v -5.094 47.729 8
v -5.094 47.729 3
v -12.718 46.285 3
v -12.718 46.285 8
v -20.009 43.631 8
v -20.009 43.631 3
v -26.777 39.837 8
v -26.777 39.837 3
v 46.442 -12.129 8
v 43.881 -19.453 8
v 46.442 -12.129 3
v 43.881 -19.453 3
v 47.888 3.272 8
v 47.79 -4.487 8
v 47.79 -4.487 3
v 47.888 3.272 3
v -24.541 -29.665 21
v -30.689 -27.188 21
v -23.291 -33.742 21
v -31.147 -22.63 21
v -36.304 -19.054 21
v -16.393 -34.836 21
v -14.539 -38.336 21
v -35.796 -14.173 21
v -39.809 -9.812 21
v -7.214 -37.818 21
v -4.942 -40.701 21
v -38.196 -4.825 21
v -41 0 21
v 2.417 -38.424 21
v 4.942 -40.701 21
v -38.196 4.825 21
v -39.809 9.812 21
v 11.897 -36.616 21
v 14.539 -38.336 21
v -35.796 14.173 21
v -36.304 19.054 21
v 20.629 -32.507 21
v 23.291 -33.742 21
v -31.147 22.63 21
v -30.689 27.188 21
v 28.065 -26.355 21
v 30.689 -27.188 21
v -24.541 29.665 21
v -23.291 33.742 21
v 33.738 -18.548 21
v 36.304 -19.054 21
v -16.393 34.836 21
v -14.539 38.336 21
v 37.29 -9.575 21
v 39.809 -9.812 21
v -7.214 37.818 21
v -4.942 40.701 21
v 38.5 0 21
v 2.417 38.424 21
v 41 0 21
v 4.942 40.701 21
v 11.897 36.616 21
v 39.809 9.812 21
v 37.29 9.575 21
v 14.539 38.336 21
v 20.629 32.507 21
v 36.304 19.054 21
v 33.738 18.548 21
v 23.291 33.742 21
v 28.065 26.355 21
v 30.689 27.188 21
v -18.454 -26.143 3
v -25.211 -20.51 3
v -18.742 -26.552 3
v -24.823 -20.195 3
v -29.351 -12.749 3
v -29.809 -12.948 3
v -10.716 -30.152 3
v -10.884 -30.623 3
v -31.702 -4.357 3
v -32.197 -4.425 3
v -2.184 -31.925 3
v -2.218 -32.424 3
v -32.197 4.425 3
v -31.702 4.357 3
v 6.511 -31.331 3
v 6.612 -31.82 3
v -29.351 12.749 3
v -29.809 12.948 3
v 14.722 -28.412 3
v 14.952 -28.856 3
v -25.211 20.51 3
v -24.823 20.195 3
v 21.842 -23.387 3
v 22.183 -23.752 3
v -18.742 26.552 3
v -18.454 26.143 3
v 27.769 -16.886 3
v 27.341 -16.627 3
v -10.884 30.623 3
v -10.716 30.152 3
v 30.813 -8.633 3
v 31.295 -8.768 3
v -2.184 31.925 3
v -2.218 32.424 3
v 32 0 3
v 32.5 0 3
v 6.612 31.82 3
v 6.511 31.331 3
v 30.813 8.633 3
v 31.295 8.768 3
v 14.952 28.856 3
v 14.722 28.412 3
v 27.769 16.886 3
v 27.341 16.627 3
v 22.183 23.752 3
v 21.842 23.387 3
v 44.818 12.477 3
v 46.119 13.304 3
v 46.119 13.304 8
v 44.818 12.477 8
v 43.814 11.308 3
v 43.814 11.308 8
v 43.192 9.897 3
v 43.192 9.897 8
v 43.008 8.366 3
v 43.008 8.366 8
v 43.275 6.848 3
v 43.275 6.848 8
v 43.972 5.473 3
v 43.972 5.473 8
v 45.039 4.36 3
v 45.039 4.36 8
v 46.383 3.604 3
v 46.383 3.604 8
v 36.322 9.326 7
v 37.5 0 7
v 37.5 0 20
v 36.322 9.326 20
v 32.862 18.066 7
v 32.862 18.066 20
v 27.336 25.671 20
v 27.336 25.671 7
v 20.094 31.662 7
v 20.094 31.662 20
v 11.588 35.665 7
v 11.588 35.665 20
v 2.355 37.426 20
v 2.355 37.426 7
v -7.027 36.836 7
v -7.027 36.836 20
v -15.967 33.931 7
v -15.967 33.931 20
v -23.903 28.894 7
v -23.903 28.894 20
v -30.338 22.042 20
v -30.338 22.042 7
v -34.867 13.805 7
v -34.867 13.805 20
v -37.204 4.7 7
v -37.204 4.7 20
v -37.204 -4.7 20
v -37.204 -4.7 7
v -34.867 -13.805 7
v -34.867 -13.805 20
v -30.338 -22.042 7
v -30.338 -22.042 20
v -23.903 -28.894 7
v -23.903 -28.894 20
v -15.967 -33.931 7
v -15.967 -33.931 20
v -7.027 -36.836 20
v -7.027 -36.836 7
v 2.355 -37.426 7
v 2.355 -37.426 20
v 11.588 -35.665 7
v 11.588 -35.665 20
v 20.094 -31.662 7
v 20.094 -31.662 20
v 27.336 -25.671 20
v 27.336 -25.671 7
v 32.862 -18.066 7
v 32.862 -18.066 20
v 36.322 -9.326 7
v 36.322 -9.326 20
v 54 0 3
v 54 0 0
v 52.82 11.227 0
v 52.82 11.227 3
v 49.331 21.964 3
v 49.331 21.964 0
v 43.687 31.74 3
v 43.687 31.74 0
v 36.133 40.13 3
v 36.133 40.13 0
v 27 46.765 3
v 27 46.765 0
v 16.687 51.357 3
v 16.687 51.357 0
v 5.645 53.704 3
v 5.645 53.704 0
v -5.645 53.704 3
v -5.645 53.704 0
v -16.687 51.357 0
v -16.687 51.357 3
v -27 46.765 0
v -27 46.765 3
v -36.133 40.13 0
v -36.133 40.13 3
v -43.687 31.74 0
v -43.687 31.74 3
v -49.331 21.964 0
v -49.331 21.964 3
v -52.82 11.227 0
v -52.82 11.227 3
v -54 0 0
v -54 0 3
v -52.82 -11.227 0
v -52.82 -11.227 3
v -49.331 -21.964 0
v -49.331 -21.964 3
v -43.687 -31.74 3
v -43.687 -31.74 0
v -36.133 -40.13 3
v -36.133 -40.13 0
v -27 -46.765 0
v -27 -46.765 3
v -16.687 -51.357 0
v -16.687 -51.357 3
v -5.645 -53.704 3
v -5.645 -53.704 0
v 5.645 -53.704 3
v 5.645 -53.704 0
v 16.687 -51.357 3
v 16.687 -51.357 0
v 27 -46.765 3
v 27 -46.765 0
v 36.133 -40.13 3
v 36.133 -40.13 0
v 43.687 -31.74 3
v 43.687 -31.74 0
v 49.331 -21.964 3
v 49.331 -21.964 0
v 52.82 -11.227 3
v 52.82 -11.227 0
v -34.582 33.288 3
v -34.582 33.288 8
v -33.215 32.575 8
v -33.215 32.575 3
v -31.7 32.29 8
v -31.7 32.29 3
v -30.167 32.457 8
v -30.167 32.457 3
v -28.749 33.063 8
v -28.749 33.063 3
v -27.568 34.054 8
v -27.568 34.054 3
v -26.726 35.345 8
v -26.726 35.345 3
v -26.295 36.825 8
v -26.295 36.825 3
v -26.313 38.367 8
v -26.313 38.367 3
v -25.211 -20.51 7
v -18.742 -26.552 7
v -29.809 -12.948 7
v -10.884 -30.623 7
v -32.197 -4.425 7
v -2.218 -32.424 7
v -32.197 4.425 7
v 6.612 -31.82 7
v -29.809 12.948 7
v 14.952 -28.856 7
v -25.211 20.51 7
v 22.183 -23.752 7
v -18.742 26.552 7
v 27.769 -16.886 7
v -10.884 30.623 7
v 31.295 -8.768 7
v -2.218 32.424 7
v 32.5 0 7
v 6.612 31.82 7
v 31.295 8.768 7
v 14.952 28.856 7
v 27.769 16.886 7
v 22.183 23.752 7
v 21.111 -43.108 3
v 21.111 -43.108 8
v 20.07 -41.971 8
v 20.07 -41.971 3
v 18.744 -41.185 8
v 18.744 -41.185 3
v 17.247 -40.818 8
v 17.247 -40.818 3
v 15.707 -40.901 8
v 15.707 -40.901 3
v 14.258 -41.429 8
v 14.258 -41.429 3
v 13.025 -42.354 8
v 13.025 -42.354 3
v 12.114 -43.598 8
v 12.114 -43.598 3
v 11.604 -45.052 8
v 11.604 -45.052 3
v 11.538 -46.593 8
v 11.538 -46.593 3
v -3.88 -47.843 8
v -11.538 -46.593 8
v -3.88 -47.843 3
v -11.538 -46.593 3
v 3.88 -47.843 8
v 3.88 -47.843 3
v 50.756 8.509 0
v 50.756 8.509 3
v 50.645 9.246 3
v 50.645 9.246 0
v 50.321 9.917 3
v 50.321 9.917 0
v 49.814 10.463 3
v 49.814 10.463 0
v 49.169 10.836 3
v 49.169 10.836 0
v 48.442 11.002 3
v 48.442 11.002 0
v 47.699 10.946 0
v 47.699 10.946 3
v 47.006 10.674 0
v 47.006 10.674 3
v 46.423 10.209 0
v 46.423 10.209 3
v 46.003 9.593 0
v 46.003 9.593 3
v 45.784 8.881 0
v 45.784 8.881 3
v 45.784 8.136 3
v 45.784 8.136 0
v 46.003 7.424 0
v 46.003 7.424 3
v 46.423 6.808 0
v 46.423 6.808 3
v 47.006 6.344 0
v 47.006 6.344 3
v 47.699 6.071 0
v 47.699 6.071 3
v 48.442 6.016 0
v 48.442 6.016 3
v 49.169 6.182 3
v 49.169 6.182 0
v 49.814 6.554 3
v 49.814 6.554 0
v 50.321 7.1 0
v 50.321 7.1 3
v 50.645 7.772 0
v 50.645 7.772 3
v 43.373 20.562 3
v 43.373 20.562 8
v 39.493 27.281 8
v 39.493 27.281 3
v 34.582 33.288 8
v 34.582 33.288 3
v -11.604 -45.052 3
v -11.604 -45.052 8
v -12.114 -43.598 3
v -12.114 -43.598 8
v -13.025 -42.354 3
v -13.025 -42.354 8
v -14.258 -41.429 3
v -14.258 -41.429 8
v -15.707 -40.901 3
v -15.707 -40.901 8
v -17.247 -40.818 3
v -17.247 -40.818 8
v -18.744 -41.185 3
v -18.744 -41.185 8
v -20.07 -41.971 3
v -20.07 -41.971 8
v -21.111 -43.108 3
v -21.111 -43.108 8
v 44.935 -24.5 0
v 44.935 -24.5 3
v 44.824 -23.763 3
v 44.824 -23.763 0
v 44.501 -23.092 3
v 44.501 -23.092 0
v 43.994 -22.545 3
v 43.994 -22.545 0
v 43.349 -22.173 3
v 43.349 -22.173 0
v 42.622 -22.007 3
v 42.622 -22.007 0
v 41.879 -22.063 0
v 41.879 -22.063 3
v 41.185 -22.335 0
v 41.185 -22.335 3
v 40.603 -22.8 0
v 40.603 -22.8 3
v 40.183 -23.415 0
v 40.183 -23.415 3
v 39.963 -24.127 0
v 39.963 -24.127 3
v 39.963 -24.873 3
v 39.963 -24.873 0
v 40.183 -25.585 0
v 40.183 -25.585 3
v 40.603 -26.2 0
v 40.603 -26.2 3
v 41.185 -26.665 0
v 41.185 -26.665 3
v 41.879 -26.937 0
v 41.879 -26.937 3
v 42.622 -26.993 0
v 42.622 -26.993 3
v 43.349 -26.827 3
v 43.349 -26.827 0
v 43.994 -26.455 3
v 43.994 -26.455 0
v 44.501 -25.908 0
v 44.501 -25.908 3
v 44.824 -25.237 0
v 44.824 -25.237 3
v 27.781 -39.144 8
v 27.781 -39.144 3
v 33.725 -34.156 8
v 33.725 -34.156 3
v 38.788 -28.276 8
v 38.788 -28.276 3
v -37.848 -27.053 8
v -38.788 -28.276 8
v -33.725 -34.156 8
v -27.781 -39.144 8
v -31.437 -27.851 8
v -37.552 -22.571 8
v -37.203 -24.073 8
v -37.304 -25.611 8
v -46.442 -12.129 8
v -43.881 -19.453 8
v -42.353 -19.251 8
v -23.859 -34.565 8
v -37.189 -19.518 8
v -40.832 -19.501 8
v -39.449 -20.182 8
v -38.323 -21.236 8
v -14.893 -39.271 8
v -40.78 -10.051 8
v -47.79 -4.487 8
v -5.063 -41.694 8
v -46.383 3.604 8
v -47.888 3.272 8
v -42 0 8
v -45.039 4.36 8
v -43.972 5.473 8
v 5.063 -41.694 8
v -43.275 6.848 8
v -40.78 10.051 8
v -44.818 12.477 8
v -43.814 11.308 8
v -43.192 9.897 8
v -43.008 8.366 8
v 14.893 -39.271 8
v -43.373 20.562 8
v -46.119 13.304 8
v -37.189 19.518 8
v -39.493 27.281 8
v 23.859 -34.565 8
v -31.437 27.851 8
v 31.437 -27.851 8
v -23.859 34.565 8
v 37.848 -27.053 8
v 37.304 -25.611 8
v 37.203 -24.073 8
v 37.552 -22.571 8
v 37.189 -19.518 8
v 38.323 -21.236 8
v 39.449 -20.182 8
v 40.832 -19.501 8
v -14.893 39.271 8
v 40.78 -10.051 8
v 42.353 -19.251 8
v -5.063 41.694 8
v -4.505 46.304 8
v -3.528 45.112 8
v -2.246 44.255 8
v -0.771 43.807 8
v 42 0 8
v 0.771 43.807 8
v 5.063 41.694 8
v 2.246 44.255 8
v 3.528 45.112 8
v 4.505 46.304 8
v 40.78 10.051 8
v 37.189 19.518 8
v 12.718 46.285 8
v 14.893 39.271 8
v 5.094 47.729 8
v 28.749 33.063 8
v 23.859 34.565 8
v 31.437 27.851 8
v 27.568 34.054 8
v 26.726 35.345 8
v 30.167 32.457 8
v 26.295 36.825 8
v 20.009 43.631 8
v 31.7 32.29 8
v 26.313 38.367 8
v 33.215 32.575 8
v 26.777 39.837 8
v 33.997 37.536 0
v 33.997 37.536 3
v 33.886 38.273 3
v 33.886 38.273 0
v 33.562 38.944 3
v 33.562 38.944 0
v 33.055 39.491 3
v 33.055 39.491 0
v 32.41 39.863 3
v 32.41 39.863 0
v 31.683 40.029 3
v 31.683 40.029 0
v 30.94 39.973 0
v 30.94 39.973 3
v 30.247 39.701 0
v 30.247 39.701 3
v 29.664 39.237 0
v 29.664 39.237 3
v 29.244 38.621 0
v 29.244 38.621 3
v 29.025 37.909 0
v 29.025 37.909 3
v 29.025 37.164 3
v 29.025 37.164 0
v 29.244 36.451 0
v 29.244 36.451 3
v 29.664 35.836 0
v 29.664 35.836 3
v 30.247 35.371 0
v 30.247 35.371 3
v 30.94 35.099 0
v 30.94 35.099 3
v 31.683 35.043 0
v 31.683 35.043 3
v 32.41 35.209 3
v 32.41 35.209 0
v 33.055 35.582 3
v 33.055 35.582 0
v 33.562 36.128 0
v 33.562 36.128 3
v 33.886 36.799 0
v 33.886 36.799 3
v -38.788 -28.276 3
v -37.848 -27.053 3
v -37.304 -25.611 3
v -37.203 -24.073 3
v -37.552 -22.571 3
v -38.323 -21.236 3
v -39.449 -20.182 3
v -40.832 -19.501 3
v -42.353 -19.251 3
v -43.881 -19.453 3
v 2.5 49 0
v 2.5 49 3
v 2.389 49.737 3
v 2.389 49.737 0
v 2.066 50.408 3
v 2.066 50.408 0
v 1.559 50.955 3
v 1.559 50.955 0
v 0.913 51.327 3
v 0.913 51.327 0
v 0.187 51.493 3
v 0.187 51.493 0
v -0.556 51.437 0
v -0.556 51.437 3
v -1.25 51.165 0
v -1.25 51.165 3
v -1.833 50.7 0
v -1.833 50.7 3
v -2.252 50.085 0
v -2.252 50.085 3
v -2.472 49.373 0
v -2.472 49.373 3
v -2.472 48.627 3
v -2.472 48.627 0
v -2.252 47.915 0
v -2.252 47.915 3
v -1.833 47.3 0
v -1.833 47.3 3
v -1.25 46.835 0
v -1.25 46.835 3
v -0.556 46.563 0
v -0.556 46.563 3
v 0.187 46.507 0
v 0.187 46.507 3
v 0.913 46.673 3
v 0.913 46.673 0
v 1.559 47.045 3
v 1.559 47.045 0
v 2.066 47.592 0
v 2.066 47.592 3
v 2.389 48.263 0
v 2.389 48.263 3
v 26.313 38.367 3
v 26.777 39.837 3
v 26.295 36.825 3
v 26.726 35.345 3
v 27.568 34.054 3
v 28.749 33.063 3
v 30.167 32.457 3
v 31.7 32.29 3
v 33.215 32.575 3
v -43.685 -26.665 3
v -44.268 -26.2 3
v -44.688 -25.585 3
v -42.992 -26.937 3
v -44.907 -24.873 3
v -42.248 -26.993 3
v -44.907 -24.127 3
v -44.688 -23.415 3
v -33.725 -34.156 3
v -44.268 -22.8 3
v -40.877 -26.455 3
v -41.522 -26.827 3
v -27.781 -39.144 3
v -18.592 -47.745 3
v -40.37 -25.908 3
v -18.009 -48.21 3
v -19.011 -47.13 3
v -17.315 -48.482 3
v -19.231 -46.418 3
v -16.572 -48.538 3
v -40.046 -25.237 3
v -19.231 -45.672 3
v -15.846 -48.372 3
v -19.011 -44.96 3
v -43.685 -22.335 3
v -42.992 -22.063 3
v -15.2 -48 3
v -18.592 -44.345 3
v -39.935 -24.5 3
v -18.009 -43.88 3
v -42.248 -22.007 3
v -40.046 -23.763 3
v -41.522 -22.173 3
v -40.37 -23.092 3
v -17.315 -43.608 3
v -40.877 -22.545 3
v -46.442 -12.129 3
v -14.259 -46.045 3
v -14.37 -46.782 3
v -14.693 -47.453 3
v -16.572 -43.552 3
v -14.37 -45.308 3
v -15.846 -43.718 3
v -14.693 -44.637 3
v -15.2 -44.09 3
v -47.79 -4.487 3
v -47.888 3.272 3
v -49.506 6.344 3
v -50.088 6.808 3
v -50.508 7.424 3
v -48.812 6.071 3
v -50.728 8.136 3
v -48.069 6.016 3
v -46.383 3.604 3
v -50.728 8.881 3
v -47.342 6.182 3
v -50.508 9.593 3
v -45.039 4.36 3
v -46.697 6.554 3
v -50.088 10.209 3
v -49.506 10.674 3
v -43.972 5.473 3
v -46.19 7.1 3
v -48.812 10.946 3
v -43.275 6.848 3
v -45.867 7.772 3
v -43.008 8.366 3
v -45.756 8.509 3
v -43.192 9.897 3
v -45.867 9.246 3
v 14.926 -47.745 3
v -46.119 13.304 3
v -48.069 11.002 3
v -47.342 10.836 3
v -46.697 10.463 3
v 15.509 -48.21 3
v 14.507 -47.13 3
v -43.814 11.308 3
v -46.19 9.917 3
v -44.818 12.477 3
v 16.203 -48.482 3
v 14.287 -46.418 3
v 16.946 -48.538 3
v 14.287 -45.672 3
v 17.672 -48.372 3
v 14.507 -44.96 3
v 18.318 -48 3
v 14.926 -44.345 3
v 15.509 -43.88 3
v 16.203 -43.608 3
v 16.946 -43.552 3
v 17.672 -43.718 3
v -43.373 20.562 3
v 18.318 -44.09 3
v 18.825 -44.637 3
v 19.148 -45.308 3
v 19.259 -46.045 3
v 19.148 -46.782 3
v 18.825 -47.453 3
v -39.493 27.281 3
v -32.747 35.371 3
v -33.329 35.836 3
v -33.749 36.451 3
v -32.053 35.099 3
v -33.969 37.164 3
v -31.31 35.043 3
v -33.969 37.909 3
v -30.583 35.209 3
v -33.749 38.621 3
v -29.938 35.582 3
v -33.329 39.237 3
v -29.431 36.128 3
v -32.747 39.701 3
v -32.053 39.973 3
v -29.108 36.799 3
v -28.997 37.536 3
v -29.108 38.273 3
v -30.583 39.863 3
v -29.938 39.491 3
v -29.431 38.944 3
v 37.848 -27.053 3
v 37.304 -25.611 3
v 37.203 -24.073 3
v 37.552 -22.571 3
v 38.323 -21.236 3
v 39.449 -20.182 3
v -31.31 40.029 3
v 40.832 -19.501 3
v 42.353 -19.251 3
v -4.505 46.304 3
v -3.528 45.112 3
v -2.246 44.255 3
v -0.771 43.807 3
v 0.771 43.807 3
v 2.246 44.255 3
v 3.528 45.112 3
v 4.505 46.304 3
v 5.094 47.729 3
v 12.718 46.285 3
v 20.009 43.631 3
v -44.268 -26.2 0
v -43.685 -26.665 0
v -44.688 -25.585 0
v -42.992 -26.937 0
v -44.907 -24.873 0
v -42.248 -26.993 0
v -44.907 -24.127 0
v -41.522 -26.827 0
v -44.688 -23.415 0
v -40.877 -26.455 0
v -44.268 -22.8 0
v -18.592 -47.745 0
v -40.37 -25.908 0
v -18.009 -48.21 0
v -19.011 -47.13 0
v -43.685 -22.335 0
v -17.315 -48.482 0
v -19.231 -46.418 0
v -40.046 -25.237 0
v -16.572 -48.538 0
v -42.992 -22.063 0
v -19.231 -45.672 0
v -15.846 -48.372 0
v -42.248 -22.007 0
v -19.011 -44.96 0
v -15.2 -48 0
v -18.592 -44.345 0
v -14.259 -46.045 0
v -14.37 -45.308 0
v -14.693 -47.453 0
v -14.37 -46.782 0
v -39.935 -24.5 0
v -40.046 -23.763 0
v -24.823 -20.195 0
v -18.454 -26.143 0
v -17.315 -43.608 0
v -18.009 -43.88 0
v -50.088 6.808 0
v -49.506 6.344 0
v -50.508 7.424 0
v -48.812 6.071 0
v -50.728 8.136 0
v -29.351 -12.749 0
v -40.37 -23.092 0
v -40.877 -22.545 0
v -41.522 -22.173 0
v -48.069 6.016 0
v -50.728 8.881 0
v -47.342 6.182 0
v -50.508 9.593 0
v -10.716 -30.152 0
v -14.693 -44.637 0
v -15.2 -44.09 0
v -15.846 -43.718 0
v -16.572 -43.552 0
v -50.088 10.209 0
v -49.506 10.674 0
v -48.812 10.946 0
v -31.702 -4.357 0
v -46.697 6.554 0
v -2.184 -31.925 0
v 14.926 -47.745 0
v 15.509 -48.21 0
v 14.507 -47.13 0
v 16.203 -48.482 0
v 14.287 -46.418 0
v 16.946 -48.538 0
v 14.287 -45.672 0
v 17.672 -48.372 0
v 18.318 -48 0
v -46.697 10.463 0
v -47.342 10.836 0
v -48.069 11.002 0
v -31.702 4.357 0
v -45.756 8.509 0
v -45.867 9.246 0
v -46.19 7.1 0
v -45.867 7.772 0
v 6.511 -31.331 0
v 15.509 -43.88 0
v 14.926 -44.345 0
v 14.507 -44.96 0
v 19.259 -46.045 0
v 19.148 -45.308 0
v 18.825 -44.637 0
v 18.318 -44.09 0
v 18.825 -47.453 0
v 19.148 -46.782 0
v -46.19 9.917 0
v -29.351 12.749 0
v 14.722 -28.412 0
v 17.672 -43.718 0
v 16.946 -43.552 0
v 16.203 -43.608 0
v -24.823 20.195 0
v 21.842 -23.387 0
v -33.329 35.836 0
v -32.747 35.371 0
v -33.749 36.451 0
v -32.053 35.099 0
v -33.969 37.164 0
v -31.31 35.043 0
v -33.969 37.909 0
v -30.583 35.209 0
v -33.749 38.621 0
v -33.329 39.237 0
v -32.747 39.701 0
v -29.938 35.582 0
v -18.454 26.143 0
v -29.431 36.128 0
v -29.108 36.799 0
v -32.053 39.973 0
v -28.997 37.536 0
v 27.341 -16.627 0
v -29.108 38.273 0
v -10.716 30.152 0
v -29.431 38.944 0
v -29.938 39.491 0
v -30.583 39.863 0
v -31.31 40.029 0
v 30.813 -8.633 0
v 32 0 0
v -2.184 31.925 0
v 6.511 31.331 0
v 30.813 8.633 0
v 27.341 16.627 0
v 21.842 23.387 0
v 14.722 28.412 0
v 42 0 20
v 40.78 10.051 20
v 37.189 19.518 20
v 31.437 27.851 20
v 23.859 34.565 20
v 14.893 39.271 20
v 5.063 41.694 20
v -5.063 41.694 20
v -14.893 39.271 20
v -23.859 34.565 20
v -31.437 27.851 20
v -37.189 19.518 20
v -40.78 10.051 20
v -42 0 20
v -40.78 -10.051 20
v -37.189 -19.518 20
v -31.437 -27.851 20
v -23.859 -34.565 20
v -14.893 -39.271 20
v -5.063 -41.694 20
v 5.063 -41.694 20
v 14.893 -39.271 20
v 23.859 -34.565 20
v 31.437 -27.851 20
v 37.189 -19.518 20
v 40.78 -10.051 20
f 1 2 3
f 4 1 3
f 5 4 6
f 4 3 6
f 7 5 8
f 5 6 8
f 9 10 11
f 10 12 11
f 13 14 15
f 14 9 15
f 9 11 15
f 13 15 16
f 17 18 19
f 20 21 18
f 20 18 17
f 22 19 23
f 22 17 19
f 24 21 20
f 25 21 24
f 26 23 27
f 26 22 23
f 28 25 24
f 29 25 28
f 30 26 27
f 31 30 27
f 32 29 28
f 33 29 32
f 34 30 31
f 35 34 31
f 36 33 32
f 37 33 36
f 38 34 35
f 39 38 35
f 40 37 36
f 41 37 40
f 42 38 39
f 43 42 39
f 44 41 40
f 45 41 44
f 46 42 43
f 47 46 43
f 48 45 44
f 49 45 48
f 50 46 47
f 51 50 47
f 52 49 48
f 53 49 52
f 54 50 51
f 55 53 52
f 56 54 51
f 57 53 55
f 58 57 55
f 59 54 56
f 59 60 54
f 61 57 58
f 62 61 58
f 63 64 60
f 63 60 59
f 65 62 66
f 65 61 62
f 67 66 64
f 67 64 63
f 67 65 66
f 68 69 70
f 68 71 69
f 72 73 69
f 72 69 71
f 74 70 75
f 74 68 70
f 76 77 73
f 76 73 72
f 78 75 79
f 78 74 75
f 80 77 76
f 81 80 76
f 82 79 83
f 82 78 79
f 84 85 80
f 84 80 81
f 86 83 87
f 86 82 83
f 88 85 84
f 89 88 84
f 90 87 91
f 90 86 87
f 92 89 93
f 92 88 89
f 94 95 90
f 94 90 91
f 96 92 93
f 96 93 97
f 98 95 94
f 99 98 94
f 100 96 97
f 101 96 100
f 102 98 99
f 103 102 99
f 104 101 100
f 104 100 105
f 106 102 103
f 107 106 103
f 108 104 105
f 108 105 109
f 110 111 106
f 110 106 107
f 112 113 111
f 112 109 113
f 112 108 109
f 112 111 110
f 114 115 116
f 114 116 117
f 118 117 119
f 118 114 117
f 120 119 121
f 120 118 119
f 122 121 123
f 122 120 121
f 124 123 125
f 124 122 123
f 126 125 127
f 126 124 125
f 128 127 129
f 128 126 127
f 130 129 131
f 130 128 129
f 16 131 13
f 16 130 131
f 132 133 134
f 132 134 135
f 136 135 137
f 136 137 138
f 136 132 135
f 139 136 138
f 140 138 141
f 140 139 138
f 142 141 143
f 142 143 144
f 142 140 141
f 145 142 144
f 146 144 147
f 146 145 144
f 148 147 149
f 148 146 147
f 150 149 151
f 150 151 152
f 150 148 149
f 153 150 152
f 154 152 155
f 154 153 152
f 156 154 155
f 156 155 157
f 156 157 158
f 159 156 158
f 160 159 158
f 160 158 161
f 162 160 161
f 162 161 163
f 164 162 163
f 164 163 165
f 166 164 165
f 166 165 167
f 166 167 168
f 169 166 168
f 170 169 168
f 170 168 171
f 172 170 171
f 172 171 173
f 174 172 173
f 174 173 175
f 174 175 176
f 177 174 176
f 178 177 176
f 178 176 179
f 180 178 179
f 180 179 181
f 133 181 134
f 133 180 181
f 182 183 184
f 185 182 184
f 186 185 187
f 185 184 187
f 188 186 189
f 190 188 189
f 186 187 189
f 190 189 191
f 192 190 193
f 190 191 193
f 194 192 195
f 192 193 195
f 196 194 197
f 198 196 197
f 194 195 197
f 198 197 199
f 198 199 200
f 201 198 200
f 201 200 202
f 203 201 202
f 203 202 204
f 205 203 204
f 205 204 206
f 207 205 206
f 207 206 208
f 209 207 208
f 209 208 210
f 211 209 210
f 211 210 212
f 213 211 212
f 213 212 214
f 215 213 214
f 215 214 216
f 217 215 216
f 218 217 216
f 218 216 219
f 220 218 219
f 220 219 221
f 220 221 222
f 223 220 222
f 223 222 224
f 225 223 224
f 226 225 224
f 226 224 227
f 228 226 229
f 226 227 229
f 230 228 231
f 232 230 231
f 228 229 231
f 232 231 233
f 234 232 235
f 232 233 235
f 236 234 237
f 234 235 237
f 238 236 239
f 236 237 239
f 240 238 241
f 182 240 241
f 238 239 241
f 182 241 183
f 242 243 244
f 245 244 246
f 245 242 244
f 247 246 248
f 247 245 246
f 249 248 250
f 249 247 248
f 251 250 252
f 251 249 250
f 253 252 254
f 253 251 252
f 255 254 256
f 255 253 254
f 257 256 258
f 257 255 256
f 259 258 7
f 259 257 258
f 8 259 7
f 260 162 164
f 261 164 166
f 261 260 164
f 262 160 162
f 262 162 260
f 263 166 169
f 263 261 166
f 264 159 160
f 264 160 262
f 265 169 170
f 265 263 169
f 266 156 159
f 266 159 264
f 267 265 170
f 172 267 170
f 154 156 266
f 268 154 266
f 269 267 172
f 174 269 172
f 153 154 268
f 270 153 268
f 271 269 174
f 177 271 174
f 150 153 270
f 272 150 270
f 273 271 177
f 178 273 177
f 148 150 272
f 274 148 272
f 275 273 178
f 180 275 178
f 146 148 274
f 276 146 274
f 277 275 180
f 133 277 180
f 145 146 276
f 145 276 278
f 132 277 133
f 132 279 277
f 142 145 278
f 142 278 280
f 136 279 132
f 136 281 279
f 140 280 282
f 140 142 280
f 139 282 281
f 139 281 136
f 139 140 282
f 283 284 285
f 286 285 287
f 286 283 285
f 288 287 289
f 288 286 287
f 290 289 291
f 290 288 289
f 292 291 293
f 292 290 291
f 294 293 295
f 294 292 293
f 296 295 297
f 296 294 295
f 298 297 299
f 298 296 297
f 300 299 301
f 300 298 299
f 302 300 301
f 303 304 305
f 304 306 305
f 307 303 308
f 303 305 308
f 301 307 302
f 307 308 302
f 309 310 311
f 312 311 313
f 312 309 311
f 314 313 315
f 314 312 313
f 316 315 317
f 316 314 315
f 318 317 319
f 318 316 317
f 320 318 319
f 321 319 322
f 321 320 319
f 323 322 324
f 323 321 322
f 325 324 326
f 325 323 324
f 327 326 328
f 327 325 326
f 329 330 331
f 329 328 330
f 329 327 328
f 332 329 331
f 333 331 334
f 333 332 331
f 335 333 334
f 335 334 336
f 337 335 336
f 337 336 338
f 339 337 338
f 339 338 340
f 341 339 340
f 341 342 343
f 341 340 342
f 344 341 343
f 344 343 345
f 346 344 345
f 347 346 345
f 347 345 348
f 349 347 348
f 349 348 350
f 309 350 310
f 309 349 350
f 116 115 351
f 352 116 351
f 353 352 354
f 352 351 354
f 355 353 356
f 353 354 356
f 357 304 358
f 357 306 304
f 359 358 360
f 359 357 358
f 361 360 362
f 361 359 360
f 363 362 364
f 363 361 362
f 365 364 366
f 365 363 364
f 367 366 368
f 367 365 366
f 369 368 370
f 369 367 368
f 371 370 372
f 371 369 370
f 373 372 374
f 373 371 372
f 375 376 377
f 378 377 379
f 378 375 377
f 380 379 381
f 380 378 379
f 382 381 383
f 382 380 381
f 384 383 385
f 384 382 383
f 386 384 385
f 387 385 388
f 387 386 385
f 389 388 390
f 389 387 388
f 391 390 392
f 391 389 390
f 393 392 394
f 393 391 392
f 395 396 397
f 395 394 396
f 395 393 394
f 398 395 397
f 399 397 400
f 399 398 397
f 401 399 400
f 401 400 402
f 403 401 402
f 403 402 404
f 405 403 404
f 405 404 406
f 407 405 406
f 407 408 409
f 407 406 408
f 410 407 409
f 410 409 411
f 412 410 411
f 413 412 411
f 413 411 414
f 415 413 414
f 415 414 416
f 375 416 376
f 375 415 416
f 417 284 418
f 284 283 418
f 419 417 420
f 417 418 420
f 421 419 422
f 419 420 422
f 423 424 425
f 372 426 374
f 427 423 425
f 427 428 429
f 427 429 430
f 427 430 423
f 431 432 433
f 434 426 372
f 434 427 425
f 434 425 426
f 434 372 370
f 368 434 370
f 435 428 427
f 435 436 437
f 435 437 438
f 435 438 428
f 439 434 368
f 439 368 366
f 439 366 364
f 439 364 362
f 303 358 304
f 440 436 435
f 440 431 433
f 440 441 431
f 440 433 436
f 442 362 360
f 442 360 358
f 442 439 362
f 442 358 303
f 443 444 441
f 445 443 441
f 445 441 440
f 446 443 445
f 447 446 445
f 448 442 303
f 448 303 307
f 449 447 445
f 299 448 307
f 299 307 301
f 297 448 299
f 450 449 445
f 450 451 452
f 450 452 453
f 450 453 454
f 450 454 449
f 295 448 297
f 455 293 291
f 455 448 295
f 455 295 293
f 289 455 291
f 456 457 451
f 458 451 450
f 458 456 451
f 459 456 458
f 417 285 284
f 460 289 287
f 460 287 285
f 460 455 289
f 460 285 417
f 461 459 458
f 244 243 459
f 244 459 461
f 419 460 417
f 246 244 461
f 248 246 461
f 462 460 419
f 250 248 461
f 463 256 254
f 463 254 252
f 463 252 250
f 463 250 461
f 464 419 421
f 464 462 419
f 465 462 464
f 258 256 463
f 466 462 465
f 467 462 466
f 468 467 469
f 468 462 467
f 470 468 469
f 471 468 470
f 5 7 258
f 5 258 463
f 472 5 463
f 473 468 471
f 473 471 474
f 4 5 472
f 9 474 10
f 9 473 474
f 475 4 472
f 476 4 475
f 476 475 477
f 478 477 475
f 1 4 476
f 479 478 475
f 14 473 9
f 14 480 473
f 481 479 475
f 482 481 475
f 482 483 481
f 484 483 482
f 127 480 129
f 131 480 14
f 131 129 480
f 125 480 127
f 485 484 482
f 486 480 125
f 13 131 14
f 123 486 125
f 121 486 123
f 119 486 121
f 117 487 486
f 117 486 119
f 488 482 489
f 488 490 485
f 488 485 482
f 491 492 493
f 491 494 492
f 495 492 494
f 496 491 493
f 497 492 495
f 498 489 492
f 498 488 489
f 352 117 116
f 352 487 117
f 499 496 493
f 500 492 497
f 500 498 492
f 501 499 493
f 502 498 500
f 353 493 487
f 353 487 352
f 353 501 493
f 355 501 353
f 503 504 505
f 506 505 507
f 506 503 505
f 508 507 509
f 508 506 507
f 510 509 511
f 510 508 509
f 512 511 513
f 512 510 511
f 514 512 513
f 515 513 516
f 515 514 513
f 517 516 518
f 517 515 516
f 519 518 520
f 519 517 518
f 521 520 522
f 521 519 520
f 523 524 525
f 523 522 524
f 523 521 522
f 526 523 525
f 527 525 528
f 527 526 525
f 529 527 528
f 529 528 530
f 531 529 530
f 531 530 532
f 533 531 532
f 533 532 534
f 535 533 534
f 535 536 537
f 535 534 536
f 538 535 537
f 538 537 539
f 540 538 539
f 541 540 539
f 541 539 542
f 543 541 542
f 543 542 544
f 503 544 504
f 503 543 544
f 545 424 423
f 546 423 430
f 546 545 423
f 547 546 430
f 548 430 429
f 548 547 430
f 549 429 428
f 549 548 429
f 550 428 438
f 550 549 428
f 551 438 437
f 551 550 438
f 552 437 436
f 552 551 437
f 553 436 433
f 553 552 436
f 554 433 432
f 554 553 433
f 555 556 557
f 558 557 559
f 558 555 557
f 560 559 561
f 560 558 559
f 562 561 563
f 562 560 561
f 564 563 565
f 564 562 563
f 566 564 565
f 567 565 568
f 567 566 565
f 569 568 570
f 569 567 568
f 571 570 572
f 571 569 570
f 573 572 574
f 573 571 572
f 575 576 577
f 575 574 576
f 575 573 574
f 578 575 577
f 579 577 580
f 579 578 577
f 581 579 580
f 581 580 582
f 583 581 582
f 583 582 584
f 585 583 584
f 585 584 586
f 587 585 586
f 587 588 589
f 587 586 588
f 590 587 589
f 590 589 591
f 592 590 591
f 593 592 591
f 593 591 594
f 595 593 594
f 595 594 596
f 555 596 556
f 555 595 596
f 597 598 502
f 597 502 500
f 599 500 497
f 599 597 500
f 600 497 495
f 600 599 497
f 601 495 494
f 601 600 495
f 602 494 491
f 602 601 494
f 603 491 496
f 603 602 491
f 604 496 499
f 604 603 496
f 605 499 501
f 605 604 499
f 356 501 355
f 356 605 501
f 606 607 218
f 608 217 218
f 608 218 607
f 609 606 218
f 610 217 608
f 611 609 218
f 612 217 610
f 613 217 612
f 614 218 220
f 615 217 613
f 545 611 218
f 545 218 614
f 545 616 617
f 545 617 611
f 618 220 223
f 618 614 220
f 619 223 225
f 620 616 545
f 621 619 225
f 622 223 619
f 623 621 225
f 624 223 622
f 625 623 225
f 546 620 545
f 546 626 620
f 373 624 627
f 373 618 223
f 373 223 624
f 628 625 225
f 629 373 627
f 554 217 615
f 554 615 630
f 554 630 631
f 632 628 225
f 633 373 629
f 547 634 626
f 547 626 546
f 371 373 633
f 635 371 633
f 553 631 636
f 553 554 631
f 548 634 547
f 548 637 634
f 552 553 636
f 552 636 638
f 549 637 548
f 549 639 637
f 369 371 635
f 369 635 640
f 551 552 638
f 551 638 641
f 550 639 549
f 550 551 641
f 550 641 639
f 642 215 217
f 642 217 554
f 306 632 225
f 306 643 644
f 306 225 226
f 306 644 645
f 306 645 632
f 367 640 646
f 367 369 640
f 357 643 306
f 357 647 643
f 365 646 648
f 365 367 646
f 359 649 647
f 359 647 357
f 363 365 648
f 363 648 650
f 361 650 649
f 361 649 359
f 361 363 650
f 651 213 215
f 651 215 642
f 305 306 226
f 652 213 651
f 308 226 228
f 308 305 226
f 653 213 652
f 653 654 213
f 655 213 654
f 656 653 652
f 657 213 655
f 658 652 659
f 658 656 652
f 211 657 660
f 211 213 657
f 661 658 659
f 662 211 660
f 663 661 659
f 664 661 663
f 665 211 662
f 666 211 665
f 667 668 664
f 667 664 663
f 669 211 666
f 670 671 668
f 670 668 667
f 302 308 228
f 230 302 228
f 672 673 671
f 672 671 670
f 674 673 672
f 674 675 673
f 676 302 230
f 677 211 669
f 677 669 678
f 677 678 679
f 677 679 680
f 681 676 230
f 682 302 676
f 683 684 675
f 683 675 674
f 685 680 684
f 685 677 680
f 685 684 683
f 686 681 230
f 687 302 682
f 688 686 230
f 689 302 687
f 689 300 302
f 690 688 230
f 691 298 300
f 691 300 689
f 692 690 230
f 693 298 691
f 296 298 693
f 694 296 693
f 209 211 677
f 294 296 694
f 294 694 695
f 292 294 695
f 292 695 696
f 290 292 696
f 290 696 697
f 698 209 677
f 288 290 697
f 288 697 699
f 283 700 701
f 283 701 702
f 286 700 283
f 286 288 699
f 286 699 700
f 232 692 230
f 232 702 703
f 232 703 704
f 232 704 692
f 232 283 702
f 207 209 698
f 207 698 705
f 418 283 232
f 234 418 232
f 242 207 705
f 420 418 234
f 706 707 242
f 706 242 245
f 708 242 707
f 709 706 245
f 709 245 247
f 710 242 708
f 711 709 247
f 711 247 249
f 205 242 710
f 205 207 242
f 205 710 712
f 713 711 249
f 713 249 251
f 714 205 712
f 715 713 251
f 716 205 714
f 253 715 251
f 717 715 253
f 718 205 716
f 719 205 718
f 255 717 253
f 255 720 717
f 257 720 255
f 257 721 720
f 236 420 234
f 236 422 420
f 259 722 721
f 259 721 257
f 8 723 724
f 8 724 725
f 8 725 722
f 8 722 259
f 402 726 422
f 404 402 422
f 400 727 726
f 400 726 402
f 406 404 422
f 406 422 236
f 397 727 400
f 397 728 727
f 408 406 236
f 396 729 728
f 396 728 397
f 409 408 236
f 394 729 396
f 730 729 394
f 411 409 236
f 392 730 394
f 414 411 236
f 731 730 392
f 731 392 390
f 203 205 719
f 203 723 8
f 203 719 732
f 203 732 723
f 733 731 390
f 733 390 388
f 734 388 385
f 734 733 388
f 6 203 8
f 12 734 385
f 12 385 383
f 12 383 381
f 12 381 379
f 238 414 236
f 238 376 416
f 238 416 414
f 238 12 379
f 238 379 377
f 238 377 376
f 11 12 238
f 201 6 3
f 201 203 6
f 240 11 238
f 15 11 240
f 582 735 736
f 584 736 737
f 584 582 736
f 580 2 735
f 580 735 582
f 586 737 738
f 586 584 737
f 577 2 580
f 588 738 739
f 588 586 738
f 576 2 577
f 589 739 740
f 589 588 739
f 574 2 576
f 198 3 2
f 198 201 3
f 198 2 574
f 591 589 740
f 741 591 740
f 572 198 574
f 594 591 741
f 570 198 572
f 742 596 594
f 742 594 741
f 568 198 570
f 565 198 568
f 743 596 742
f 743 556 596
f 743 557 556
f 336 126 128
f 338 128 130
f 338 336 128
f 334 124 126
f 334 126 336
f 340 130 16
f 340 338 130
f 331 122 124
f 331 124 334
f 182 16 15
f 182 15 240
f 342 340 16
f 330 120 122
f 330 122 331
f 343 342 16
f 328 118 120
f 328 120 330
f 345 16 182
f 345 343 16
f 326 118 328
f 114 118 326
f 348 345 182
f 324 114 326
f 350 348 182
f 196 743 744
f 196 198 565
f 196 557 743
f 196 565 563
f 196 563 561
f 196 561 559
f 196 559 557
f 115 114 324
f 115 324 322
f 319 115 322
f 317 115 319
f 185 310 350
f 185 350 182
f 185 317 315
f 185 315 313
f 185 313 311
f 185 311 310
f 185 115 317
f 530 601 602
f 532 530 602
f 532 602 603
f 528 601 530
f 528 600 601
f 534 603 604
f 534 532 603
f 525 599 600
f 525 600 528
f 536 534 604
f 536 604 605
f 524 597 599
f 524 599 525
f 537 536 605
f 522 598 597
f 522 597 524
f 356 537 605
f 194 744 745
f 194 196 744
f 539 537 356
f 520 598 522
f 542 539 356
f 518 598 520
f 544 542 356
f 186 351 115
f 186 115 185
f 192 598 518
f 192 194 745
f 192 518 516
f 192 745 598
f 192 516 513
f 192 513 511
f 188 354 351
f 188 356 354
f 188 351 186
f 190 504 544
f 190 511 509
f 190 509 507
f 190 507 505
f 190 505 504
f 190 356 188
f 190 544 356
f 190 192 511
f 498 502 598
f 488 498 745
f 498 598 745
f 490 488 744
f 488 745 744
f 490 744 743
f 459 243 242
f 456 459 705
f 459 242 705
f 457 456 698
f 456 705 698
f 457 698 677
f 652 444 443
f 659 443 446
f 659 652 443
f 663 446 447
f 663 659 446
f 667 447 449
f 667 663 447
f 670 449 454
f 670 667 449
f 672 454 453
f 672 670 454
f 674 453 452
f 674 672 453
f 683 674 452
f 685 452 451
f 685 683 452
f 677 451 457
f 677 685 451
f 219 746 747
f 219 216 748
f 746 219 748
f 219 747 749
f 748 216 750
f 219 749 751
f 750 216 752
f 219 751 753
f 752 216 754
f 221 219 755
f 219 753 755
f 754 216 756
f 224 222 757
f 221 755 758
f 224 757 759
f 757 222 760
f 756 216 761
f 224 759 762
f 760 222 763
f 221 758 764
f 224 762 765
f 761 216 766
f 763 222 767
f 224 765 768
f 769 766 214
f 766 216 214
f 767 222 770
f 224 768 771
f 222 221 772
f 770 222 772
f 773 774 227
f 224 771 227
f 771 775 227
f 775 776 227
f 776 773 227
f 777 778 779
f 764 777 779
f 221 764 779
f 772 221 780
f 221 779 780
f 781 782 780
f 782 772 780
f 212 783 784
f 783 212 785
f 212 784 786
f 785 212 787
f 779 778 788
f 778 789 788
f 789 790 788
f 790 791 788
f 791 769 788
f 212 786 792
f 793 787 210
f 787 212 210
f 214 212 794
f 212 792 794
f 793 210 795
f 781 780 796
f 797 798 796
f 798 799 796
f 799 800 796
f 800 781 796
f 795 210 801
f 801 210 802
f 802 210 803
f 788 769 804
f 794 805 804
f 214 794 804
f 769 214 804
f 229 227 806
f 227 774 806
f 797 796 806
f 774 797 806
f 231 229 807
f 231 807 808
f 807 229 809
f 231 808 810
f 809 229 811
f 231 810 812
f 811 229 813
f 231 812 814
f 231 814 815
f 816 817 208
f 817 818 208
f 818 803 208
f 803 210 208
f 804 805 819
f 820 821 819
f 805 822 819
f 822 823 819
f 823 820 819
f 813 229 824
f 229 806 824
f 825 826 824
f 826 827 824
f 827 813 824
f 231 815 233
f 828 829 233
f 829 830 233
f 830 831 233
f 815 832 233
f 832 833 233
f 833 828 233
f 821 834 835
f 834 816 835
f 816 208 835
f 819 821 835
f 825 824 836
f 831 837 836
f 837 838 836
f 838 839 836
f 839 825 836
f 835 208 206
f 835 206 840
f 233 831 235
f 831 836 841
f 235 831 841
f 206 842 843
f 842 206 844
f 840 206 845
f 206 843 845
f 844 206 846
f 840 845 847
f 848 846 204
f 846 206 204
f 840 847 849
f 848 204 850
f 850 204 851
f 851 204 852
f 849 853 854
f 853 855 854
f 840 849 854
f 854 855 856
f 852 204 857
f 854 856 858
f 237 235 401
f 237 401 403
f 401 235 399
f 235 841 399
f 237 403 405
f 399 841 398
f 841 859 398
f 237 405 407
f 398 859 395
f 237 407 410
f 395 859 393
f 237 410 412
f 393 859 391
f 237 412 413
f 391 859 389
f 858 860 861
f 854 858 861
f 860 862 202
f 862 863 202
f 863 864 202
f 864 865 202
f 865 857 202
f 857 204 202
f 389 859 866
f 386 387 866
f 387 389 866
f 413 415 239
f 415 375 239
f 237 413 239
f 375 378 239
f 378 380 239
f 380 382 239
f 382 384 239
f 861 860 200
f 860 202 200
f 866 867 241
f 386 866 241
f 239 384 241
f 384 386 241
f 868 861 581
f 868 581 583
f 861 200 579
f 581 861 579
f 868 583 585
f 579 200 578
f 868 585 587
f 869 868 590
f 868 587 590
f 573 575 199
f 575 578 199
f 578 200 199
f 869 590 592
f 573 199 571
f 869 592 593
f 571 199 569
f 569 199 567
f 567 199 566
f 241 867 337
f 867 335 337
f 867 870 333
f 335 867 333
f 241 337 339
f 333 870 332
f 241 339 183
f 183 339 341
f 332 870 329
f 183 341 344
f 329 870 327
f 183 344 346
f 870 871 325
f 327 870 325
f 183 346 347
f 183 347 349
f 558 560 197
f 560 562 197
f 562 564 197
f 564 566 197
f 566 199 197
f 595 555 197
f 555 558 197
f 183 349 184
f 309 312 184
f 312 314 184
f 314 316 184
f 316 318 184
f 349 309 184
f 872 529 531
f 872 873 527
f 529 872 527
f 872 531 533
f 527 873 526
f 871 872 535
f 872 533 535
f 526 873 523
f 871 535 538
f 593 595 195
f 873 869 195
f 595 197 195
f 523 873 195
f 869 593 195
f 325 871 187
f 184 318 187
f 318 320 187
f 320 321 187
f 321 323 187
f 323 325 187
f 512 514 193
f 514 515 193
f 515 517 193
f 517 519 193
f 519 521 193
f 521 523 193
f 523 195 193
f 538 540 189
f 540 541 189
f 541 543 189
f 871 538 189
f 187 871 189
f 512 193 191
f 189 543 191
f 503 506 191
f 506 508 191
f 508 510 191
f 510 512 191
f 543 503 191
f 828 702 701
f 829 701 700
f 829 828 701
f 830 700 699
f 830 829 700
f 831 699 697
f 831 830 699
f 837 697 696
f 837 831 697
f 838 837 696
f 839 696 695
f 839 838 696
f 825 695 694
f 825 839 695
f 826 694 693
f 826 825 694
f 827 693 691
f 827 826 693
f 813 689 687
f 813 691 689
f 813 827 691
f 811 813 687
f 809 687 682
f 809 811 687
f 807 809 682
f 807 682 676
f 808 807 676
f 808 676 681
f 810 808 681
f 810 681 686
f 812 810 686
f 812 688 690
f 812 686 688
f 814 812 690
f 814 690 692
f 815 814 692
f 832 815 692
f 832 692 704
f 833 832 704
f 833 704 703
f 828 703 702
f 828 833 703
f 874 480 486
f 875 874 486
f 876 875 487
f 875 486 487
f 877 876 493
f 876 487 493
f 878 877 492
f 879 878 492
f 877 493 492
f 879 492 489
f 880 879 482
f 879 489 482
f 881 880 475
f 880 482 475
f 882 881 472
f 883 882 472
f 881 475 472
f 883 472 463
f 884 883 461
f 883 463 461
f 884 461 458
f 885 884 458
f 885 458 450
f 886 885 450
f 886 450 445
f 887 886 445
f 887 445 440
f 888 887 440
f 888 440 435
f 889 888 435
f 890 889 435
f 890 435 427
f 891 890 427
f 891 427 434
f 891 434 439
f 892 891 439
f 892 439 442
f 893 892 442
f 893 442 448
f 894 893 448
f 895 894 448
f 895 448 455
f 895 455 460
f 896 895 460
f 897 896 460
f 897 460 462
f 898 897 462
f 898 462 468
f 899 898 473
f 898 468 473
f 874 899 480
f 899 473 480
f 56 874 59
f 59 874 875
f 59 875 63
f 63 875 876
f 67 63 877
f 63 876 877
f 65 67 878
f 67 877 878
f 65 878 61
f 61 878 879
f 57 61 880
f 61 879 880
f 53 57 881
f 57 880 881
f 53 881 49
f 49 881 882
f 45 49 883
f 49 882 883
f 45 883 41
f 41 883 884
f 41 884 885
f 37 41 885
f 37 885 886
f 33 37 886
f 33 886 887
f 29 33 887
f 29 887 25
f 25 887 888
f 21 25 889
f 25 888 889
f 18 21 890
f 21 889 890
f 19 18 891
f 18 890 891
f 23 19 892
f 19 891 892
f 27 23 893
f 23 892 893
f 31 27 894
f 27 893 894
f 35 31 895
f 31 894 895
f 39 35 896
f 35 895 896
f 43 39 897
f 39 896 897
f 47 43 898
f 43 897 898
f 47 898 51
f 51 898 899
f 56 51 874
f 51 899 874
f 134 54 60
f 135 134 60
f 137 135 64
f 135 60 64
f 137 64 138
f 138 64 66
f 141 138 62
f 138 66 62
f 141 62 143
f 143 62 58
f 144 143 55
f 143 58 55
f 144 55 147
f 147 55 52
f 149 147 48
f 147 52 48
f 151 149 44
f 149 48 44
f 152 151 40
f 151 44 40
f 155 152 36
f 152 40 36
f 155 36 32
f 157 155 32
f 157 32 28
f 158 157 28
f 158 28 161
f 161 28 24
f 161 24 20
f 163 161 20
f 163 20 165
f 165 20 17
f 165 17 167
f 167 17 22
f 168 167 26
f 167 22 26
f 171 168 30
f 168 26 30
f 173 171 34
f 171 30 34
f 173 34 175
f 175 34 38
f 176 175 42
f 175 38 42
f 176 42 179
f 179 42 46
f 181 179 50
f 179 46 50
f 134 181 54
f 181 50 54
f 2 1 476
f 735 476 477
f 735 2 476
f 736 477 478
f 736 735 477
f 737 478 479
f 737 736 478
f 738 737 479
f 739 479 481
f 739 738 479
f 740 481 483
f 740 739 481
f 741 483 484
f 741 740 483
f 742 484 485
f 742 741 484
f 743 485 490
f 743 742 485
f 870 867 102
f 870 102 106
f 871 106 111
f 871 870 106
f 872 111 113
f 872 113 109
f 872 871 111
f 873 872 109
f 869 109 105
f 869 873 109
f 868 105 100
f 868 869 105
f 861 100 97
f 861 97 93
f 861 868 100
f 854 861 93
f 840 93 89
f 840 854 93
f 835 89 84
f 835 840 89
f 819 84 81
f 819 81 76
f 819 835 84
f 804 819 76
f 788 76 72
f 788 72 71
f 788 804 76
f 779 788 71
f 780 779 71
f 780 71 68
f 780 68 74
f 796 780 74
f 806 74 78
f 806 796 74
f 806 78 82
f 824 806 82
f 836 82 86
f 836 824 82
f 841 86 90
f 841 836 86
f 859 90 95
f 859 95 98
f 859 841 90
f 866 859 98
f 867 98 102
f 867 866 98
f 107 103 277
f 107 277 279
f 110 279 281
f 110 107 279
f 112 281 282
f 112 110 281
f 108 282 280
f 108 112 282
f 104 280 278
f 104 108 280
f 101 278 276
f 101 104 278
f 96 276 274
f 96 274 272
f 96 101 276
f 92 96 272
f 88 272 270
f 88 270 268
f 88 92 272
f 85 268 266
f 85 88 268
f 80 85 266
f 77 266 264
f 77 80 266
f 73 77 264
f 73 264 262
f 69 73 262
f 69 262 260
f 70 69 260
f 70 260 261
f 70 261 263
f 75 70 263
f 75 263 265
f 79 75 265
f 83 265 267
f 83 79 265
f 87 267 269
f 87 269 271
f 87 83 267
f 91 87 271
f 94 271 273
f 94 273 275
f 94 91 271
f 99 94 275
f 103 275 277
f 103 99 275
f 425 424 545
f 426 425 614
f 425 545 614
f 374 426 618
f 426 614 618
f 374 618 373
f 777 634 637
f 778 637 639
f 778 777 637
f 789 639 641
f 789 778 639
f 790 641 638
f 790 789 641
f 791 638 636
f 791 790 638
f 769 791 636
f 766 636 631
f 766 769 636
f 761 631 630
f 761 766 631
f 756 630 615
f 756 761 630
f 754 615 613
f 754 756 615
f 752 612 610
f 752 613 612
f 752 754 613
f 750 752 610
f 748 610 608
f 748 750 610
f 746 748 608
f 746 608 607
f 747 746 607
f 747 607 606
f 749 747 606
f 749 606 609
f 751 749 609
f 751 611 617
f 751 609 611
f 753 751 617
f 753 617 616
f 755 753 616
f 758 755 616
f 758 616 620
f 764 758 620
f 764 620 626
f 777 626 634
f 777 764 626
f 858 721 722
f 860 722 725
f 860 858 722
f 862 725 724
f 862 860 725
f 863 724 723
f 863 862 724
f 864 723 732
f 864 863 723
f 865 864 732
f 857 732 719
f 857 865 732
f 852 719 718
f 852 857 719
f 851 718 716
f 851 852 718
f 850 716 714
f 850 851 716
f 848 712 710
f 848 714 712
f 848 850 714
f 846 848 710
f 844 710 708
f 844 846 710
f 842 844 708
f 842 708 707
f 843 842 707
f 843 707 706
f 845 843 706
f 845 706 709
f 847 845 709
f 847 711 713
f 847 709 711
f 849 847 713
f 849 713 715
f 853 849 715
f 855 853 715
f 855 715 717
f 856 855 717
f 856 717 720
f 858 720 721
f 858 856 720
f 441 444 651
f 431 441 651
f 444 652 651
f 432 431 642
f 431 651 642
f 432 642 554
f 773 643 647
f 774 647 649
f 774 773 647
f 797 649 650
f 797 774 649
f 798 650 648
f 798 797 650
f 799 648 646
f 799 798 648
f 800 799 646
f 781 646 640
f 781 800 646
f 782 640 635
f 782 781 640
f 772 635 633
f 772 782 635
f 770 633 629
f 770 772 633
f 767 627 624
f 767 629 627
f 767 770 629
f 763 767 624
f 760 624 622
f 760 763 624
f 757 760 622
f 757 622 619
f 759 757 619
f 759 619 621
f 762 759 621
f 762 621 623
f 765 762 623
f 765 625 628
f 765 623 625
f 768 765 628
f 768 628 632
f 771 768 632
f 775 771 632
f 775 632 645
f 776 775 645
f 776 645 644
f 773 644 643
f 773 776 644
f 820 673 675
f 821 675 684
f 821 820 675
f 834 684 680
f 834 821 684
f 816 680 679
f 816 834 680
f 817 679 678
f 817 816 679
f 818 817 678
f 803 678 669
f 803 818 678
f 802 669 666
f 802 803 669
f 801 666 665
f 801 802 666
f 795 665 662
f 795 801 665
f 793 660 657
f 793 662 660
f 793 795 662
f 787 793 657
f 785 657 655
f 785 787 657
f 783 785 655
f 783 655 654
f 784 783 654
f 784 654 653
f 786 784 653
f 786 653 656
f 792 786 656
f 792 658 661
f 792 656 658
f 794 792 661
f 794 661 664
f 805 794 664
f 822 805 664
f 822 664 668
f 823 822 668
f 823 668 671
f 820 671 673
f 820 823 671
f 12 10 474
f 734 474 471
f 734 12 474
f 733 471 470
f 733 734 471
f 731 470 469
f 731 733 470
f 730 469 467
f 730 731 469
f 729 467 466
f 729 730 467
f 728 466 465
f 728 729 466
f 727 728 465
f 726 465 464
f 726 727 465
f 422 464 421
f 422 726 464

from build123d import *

# Parameters (mm, degrees)
SKETCH_R      = 54
SKETCH_R_2    = 32
SKETCH_R_3    = 2.5
PAD_DEPTH     = 3
SKETCH001_R   = 37.5
SKETCH001_R_2 = 32.5
PAD001_DEPTH  = 4
SKETCH002_R   = 42
SKETCH002_R_2 = 37.5
PAD002_DEPTH  = 18
SKETCH003_R   = 48
SKETCH003_R_2 = 42
PAD003_DEPTH  = 5
SKETCH004_R   = 32
SKETCH004_R_2 = 5.25
POCKET_DEPTH  = 18.001
CHAMFER_SIZE  = 1


with BuildPart() as part:
    # Sketch → Pad (new body)
    with BuildSketch(Plane.XY):
        Circle(SKETCH_R)
        Circle(SKETCH_R_2, mode=Mode.SUBTRACT)
        with Locations((31.496593, 37.536178)):
            Circle(SKETCH_R_3, mode=Mode.SUBTRACT)
        with Locations((48.25558, 8.508761)):
            Circle(SKETCH_R_3, mode=Mode.SUBTRACT)
        with Locations((42.435245, -24.5)):
            Circle(SKETCH_R_3, mode=Mode.SUBTRACT)
        with Locations((16.758987, -46.044938)):
            Circle(SKETCH_R_3, mode=Mode.SUBTRACT)
        with Locations((-16.758987, -46.044938)):
            Circle(SKETCH_R_3, mode=Mode.SUBTRACT)
        with Locations((-42.435245, -24.5)):
            Circle(SKETCH_R_3, mode=Mode.SUBTRACT)
        with Locations((-48.25558, 8.508761)):
            Circle(SKETCH_R_3, mode=Mode.SUBTRACT)
        with Locations((-31.496593, 37.536178)):
            Circle(SKETCH_R_3, mode=Mode.SUBTRACT)
        with Locations((0, 49)):
            Circle(SKETCH_R_3, mode=Mode.SUBTRACT)
    extrude(amount=PAD_DEPTH)

    # Sketch001 (on Face13 of Pad) → Pad001 (join)
    with BuildSketch(Plane.XY.offset(3)):
        Circle(SKETCH001_R)
        Circle(SKETCH001_R_2, mode=Mode.SUBTRACT)
    extrude(amount=PAD001_DEPTH)

    # Sketch002 (on Face3 of Pad001) → Pad002 (join)
    with BuildSketch(Plane.XY.offset(3)):
        Circle(SKETCH002_R)
        Circle(SKETCH002_R_2, mode=Mode.SUBTRACT)
    extrude(amount=PAD002_DEPTH)

    # Sketch003 (on Face3 of Pad002) → Pad003 (join)
    with BuildSketch(Plane.XY.offset(3)):
        Circle(SKETCH003_R)
        Circle(SKETCH003_R_2, mode=Mode.SUBTRACT)
    extrude(amount=PAD003_DEPTH)

    # Sketch004 → Pocket (cut, through all)
    with BuildSketch(Plane.XY.offset(3)):
        Circle(SKETCH004_R)
        with Locations((31.496593, 37.536178)):
            Circle(SKETCH004_R_2)
        with Locations((48.25558, 8.508761)):
            Circle(SKETCH004_R_2)
        with Locations((42.435245, -24.5)):
            Circle(SKETCH004_R_2)
        with Locations((16.758987, -46.044938)):
            Circle(SKETCH004_R_2)
        with Locations((-16.758987, -46.044938)):
            Circle(SKETCH004_R_2)
        with Locations((-42.435245, -24.5)):
            Circle(SKETCH004_R_2)
        with Locations((-48.25558, 8.508761)):
            Circle(SKETCH004_R_2)
        with Locations((-31.496593, 37.536178)):
            Circle(SKETCH004_R_2)
        with Locations((0, 49)):
            Circle(SKETCH004_R_2)
    extrude(amount=POCKET_DEPTH, mode=Mode.SUBTRACT)

    # Chamfer
    chamfer_edges = [part.edges().sort_by_distance(p)[0] for p in [
        (-37.5, 0, 21),
        (-42, 0, 21),
    ]]
    chamfer(chamfer_edges, length=CHAMFER_SIZE)


solid = part.part
